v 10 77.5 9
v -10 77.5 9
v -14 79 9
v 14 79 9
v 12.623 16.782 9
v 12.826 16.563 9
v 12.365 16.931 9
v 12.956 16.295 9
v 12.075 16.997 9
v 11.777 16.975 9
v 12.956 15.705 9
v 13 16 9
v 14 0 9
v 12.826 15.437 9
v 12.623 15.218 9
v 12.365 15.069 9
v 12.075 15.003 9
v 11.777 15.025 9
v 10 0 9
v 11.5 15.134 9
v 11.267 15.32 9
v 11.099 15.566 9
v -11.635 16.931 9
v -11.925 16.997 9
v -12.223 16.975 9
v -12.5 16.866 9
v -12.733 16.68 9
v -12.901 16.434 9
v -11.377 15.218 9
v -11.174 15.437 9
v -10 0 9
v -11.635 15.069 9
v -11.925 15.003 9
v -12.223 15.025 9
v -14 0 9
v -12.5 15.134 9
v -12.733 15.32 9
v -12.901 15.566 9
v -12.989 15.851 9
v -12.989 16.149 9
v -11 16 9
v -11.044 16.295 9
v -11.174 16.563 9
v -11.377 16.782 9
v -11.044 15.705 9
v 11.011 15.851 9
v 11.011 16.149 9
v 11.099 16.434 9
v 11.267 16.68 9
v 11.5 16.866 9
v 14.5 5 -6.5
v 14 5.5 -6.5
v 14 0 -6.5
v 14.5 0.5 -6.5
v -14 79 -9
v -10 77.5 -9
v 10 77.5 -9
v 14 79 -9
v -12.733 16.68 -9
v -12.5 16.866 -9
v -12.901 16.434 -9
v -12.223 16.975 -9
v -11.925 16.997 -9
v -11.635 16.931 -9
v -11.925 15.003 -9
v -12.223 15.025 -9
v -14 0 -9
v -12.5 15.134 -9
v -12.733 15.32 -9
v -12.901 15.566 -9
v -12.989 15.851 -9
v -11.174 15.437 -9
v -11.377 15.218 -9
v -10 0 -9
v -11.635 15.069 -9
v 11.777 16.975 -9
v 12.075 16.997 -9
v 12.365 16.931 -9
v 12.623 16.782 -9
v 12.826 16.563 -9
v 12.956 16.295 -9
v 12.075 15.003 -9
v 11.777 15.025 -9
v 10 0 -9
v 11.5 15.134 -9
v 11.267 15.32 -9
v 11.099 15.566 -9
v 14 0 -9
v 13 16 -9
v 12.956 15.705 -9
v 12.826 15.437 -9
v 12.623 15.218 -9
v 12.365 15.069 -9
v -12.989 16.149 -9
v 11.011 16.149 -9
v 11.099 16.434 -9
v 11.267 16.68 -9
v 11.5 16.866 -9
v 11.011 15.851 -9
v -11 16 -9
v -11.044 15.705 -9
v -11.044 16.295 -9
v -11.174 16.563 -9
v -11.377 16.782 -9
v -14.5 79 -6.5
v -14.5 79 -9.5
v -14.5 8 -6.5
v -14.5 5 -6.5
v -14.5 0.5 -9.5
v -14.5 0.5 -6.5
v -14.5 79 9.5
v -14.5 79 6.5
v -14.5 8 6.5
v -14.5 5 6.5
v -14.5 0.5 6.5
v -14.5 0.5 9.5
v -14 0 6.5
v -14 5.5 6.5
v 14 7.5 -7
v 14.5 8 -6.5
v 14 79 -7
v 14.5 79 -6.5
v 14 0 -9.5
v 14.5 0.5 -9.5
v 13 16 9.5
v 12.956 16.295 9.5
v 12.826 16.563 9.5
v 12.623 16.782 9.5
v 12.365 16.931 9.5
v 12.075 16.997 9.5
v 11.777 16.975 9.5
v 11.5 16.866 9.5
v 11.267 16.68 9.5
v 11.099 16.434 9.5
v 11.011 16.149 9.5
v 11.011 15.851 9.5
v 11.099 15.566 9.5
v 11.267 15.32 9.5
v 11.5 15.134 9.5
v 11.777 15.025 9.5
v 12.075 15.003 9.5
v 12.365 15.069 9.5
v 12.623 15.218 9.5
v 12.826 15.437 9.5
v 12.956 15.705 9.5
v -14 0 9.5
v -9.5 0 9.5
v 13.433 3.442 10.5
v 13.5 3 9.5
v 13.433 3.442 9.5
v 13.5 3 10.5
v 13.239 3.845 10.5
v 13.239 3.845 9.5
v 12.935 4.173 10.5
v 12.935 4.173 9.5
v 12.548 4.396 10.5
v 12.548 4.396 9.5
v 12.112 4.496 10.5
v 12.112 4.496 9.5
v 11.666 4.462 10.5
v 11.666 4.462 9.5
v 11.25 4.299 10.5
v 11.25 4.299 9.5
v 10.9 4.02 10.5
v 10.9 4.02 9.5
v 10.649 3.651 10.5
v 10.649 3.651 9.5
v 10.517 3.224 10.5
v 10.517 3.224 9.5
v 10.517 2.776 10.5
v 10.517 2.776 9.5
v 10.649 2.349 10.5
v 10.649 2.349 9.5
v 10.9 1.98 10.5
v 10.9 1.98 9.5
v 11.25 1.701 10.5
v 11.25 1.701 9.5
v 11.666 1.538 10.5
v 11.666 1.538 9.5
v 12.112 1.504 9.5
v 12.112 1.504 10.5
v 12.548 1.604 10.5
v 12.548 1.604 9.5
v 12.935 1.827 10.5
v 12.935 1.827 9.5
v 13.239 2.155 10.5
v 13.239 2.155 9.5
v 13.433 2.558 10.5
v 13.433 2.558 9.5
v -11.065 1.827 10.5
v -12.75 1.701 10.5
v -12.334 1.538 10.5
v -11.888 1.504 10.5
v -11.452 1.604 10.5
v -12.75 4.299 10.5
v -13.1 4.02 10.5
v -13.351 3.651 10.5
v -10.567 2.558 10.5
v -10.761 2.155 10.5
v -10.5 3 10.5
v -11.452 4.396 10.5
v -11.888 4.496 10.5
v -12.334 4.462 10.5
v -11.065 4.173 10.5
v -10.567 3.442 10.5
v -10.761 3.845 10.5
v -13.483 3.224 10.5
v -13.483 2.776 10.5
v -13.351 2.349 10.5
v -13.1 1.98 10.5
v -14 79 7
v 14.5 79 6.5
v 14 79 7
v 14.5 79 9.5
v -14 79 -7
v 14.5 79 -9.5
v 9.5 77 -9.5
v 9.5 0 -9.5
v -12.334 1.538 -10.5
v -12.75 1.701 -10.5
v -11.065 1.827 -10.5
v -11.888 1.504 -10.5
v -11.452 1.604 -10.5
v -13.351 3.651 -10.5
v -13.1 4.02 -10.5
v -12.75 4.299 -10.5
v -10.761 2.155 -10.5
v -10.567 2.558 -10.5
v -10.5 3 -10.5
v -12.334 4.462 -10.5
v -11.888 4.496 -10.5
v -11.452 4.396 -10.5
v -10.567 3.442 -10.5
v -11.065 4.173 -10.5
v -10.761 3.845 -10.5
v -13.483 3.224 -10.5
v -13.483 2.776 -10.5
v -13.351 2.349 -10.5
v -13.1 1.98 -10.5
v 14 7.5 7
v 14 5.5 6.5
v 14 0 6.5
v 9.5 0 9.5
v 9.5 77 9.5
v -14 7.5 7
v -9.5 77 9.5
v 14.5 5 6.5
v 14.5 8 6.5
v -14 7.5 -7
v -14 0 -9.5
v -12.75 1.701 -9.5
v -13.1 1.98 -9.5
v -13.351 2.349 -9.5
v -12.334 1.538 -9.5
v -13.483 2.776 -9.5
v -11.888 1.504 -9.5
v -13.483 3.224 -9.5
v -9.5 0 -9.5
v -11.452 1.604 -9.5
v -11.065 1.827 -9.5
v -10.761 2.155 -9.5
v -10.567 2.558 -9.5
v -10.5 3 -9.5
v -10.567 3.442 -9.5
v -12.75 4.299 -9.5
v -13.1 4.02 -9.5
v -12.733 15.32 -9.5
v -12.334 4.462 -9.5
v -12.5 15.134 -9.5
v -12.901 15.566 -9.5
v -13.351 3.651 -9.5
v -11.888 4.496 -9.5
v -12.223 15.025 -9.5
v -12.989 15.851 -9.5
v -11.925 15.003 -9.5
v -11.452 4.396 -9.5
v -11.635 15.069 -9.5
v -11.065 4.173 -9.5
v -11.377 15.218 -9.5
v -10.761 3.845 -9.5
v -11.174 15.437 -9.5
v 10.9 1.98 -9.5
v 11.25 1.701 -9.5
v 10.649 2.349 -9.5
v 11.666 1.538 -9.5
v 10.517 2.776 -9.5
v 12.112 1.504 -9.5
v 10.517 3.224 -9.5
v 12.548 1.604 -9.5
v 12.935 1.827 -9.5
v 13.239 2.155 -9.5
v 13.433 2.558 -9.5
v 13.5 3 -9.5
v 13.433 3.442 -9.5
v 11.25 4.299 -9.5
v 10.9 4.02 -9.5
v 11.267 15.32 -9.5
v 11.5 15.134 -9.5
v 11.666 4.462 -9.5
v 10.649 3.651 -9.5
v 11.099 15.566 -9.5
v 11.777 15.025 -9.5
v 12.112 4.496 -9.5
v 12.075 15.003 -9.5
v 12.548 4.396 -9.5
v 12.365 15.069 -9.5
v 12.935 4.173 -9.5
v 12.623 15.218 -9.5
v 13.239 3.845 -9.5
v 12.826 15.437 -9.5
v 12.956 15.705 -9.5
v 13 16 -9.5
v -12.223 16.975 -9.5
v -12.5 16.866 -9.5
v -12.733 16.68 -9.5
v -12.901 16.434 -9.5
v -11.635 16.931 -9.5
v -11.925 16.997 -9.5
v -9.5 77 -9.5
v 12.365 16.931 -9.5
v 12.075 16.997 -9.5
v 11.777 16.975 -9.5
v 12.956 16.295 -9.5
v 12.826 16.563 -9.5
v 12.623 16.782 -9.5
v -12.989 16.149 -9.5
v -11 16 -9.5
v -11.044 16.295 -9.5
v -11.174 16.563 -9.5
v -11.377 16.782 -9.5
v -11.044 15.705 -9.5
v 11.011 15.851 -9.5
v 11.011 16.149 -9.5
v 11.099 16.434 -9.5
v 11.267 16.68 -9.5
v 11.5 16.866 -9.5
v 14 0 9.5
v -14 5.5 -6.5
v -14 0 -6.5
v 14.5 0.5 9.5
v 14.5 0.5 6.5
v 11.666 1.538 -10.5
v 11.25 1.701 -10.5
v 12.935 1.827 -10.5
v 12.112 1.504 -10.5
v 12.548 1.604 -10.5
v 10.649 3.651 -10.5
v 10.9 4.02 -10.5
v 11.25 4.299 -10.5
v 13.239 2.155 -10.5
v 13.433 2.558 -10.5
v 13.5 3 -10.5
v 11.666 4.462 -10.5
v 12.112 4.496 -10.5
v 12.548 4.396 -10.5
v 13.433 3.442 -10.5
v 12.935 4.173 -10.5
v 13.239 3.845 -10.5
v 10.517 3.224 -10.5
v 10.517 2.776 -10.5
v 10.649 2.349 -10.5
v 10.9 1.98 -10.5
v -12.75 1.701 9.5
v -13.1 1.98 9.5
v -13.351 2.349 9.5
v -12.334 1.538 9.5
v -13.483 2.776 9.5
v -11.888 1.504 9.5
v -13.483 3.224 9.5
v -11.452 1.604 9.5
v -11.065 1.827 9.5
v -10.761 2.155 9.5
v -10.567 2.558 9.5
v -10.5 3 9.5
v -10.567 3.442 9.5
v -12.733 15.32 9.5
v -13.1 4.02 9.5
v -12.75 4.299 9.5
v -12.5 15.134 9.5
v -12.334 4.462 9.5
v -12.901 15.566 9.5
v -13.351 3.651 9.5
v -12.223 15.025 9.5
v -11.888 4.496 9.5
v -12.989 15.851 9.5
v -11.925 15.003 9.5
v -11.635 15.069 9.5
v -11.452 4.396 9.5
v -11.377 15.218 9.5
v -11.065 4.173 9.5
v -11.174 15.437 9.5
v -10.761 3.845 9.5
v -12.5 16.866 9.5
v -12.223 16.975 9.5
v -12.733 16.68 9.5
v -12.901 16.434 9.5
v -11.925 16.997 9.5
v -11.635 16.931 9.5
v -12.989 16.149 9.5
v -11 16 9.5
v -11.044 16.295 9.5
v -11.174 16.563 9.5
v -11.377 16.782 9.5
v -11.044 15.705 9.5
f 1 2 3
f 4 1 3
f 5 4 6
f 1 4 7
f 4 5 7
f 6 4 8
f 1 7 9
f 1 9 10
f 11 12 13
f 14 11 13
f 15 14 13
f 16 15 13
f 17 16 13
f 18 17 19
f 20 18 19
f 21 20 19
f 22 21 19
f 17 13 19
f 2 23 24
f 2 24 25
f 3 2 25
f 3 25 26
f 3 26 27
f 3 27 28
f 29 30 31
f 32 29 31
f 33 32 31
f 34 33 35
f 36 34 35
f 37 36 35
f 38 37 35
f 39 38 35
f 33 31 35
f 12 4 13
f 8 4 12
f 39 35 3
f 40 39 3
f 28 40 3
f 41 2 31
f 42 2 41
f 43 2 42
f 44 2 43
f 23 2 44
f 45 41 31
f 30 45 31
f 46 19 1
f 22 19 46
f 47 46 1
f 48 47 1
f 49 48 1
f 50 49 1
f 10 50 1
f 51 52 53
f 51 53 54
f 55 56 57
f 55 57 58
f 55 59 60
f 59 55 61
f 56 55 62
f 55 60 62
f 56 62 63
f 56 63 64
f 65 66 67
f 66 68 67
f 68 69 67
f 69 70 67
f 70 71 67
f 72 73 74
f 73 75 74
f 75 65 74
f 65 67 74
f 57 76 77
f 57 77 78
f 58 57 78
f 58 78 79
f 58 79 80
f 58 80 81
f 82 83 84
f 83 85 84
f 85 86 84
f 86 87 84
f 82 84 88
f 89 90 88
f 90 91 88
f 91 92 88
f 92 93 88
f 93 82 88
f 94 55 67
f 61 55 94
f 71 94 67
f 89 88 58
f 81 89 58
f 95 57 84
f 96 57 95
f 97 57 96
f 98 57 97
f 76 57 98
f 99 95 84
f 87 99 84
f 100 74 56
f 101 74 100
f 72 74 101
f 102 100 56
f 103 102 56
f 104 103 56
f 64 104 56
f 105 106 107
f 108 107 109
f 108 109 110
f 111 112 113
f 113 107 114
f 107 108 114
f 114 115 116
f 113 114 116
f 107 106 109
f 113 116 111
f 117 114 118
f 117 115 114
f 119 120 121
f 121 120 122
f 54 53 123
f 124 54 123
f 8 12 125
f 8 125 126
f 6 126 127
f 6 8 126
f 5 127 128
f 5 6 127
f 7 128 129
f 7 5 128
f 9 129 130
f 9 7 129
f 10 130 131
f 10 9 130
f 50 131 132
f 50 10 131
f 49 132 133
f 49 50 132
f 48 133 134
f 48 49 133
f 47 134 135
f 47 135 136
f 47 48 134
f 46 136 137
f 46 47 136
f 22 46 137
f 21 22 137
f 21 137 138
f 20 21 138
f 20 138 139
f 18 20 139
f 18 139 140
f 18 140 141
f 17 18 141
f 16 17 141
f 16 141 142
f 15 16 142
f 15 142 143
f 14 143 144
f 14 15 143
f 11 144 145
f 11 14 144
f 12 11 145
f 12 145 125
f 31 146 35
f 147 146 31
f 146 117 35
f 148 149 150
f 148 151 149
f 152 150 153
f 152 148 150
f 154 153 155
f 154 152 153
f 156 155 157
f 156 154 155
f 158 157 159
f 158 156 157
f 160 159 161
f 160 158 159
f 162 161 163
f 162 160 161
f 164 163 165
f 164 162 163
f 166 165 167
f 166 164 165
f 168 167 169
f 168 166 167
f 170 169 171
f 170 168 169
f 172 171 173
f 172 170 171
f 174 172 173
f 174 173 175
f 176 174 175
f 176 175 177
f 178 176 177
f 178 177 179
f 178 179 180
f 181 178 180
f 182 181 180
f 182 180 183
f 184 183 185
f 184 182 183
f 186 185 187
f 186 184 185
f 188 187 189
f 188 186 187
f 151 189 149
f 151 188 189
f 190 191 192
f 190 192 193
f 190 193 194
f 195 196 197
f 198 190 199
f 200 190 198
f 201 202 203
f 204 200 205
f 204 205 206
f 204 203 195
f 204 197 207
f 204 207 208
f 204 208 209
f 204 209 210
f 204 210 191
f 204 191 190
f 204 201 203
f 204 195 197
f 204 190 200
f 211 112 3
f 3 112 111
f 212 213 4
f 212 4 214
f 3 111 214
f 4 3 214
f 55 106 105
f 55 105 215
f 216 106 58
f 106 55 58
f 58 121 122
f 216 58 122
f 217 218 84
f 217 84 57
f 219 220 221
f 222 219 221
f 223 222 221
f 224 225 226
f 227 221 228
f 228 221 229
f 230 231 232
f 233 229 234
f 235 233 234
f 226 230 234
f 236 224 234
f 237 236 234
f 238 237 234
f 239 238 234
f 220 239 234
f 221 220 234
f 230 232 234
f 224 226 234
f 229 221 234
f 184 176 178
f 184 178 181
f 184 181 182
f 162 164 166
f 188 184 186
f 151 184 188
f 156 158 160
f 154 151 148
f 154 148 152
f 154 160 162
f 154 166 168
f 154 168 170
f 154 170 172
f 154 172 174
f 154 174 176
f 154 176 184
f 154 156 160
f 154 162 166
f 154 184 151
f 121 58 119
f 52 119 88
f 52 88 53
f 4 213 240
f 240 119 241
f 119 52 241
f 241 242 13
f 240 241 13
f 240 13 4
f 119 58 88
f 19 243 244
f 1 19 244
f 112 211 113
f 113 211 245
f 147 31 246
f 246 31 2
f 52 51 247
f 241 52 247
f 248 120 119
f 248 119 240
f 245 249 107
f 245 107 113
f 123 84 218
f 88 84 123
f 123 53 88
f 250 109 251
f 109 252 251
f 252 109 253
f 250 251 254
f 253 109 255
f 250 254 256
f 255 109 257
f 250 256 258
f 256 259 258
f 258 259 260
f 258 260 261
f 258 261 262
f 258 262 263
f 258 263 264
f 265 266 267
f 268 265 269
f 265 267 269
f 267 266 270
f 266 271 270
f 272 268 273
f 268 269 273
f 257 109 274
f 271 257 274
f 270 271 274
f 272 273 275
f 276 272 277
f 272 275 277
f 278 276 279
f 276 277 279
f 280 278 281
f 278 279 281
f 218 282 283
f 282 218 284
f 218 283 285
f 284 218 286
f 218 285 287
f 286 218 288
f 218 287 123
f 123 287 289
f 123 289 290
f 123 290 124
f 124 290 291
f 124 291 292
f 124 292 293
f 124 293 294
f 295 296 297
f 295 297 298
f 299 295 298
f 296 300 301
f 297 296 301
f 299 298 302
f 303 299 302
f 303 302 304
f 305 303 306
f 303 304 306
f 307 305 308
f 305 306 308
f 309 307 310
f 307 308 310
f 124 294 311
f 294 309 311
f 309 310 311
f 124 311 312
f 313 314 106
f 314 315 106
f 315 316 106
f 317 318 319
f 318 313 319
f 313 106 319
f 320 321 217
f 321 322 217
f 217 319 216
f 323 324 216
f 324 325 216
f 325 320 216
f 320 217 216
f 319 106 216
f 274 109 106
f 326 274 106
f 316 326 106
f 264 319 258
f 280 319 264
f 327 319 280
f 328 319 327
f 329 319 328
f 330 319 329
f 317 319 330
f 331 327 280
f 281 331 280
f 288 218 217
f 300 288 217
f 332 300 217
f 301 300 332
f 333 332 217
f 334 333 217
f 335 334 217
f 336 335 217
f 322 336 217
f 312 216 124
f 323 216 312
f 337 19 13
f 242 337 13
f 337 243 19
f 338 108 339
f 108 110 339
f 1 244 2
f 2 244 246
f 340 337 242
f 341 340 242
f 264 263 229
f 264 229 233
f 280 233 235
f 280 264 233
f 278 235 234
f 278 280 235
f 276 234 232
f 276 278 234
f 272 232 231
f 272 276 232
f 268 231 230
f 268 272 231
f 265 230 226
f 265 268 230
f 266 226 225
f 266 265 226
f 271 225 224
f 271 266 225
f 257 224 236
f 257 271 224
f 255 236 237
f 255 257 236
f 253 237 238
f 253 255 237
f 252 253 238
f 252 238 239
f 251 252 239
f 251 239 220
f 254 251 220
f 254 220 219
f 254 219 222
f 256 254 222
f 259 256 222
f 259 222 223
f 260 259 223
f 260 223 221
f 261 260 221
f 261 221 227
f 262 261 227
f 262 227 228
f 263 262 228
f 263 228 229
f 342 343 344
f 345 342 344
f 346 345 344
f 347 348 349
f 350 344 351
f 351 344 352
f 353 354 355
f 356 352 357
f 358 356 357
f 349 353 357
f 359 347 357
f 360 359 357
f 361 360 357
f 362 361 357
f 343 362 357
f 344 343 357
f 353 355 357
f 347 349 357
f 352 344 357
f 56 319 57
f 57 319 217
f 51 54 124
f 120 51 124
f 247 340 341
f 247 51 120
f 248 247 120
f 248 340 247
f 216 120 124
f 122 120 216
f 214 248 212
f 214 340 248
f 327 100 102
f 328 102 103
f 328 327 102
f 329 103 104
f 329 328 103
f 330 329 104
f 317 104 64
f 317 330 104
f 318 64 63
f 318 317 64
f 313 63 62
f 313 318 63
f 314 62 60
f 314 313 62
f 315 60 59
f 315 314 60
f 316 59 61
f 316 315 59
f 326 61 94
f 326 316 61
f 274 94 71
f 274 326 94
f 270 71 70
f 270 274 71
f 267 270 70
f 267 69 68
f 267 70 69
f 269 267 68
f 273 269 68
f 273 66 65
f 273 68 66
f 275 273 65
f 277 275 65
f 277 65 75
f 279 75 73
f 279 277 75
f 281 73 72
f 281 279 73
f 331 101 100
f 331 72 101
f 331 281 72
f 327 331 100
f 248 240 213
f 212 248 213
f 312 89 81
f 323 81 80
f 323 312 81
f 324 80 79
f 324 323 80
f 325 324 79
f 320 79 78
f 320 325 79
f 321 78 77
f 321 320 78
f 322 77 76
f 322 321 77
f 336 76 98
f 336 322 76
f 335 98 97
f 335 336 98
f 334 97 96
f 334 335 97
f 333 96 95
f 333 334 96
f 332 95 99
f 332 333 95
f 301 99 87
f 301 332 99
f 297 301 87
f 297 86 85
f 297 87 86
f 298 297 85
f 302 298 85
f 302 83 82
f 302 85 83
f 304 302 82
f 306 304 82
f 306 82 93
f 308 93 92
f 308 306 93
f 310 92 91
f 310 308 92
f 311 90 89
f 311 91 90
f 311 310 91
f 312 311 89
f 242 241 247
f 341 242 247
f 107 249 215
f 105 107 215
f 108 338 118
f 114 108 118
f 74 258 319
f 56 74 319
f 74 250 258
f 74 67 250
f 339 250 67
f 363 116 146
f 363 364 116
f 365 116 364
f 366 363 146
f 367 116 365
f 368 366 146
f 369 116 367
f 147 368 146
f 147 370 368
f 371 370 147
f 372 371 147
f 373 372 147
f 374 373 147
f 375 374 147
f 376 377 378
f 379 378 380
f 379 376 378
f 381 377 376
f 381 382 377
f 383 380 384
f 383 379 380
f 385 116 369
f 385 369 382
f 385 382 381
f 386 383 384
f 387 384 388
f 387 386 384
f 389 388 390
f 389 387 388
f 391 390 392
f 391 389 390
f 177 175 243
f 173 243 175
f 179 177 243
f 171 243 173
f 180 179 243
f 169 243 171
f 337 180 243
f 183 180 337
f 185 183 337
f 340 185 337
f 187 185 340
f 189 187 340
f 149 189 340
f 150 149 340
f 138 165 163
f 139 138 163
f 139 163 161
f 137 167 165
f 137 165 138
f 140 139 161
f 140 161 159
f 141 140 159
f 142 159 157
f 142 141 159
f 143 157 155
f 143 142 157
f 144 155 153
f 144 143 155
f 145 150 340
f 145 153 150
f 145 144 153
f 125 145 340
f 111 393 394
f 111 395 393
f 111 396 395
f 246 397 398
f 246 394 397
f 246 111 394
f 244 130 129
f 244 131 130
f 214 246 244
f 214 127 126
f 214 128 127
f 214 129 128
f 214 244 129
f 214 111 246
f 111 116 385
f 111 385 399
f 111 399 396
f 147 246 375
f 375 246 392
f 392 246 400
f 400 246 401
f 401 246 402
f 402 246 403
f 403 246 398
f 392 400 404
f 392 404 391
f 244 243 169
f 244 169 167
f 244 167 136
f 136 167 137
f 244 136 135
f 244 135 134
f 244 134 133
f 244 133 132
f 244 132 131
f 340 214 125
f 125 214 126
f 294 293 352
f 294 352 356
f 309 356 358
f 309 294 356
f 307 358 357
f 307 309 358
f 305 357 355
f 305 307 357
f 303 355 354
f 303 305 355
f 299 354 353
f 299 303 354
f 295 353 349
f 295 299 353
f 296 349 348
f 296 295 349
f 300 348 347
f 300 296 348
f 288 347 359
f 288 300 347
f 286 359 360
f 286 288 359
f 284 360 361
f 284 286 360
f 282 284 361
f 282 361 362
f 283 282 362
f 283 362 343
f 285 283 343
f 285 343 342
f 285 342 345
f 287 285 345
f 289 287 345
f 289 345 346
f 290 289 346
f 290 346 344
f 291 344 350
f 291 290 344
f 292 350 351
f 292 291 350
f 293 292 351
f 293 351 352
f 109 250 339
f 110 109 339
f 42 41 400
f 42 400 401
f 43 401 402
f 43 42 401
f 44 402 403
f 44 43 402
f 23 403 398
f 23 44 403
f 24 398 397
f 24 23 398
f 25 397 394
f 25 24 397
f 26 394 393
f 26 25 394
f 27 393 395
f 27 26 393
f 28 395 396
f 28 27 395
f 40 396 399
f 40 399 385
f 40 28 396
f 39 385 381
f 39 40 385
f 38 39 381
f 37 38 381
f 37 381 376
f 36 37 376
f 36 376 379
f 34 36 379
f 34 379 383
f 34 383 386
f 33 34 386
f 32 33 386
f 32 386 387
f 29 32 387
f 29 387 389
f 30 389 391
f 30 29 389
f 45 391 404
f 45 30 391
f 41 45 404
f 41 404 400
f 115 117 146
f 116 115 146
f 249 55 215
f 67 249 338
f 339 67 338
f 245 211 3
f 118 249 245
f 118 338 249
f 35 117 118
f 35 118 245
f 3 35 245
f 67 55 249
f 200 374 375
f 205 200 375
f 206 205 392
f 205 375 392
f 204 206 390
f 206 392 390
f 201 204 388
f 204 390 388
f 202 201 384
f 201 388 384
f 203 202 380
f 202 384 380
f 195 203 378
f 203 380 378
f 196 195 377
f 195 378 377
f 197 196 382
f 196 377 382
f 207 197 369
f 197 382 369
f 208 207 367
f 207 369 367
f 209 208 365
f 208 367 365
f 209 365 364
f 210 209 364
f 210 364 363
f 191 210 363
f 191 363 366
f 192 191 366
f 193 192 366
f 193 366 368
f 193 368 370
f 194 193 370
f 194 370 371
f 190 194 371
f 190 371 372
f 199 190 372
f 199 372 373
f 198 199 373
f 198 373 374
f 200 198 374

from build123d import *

# Parameters (mm, degrees)
F0_W     = 29
F0_H     = 79
F0_R     = 1.5
F0_R_2   = 1
F1_DEPTH = 9.5
F2_DEPTH = 10.5
F3_W     = 0.5
F3_H     = 13
F3_W_2   = 19
F3_H_2   = 0.5
F4_DEPTH = 77
F5_DEPTH = 79
F6_DEPTH = 8
F7_DEPTH = 5
F8_SIZE2 = 0.49999
F8_SIZE  = 0.49999


# Not quite as in the source:
# - a fillet or chamfer is up to 0.001 mm smaller than in the source, because OpenCascade refuses the exact size


with BuildPart() as f1:
    # F0 (on Top) → F1 (new body, symmetric)
    with BuildSketch(Plane.XY):
        with Locations((0, 39.5)):
            Rectangle(F0_W, F0_H)
        with Locations((-12, 3)):
            Circle(F0_R, mode=Mode.SUBTRACT)
        with Locations((-12, 16)):
            Circle(F0_R_2, mode=Mode.SUBTRACT)
        with Locations((12, 3)):
            Circle(F0_R, mode=Mode.SUBTRACT)
        with Locations((12, 16)):
            Circle(F0_R_2, mode=Mode.SUBTRACT)
    extrude(amount=F1_DEPTH, both=True)

    # F0 (on Top) → F2 (join, symmetric)
    with BuildSketch(Plane.XY):
        with Locations((-12, 3)):
            Circle(F0_R)
        with Locations((12, 3)):
            Circle(F0_R)
    extrude(amount=F2_DEPTH, both=True)

    # F3 (on Front) → F4 (cut)
    with BuildSketch(Plane.XZ):
        Polygon((9.5, 9), (-9.5, 9), (-14, 9), (-14, 6.5), (-14, -6.5), (-14, -9), (-9.5, -9), (9.5, -9), (14, -9), (14, -6.5), (14, 6.5), (14, 9), align=None)
        with Locations((-14.25, 0)):
            Rectangle(F3_W, F3_H)
        with Locations((0, 9.25)):
            Rectangle(F3_W_2, F3_H_2)
        with Locations((14.25, 0)):
            Rectangle(F3_W, F3_H)
        with Locations((0, -9.25)):
            Rectangle(F3_W_2, F3_H_2)
    extrude(amount=-F4_DEPTH, mode=Mode.SUBTRACT)

    # F3 (on Front) → F5 (cut)
    with BuildSketch(Plane.XZ):
        Polygon((9.5, 9), (-9.5, 9), (-14, 9), (-14, 6.5), (-14, -6.5), (-14, -9), (-9.5, -9), (9.5, -9), (14, -9), (14, -6.5), (14, 6.5), (14, 9), align=None)
        with Locations((-14.25, 0)):
            Rectangle(F3_W, F3_H)
        with Locations((14.25, 0)):
            Rectangle(F3_W, F3_H)
    extrude(amount=-F5_DEPTH, mode=Mode.SUBTRACT)

    # F3 (on Front) → F6 (join)
    with BuildSketch(Plane.XZ):
        with Locations((-14.25, 0)):
            Rectangle(F3_W, F3_H)
        with Locations((14.25, 0)):
            Rectangle(F3_W, F3_H)
    extrude(amount=-F6_DEPTH)

    # F3 (on Front) → F7 (cut)
    with BuildSketch(Plane.XZ):
        with Locations((-14.25, 0)):
            Rectangle(F3_W, F3_H)
        with Locations((14.25, 0)):
            Rectangle(F3_W, F3_H)
    extrude(amount=-F7_DEPTH, mode=Mode.SUBTRACT)

    # F8 (size 0.5 and 0.5 in the source; OpenCascade refuses exactly that, so slightly less here)
    f8_edges = [f1.edges().sort_by_distance(p)[0] for p in [
        (-9.5, 38.5, -9),
        (9.5, 38.5, -9),
        (14, 43.5, -6.5),
        (-14, 43.5, -6.5),
        (14, 43.5, 6.5),
        (9.5, 38.5, 9),
        (-14, 43.5, 6.5),
        (-9.5, 38.5, 9),
        (14.5, 0, -8),
        (14.5, 0, 8),
        (-14.5, 0, -8),
        (-14.5, 0, 8),
        (-14, 5, 0),
        (14, 5, 0),
        (-14, 8, 0),
        (14, 8, 0),
        (0, 77, -9),
        (0, 77, 9),
    ]]
    chamfer(f8_edges, length=F8_SIZE, length2=F8_SIZE2)


solid = f1.part
